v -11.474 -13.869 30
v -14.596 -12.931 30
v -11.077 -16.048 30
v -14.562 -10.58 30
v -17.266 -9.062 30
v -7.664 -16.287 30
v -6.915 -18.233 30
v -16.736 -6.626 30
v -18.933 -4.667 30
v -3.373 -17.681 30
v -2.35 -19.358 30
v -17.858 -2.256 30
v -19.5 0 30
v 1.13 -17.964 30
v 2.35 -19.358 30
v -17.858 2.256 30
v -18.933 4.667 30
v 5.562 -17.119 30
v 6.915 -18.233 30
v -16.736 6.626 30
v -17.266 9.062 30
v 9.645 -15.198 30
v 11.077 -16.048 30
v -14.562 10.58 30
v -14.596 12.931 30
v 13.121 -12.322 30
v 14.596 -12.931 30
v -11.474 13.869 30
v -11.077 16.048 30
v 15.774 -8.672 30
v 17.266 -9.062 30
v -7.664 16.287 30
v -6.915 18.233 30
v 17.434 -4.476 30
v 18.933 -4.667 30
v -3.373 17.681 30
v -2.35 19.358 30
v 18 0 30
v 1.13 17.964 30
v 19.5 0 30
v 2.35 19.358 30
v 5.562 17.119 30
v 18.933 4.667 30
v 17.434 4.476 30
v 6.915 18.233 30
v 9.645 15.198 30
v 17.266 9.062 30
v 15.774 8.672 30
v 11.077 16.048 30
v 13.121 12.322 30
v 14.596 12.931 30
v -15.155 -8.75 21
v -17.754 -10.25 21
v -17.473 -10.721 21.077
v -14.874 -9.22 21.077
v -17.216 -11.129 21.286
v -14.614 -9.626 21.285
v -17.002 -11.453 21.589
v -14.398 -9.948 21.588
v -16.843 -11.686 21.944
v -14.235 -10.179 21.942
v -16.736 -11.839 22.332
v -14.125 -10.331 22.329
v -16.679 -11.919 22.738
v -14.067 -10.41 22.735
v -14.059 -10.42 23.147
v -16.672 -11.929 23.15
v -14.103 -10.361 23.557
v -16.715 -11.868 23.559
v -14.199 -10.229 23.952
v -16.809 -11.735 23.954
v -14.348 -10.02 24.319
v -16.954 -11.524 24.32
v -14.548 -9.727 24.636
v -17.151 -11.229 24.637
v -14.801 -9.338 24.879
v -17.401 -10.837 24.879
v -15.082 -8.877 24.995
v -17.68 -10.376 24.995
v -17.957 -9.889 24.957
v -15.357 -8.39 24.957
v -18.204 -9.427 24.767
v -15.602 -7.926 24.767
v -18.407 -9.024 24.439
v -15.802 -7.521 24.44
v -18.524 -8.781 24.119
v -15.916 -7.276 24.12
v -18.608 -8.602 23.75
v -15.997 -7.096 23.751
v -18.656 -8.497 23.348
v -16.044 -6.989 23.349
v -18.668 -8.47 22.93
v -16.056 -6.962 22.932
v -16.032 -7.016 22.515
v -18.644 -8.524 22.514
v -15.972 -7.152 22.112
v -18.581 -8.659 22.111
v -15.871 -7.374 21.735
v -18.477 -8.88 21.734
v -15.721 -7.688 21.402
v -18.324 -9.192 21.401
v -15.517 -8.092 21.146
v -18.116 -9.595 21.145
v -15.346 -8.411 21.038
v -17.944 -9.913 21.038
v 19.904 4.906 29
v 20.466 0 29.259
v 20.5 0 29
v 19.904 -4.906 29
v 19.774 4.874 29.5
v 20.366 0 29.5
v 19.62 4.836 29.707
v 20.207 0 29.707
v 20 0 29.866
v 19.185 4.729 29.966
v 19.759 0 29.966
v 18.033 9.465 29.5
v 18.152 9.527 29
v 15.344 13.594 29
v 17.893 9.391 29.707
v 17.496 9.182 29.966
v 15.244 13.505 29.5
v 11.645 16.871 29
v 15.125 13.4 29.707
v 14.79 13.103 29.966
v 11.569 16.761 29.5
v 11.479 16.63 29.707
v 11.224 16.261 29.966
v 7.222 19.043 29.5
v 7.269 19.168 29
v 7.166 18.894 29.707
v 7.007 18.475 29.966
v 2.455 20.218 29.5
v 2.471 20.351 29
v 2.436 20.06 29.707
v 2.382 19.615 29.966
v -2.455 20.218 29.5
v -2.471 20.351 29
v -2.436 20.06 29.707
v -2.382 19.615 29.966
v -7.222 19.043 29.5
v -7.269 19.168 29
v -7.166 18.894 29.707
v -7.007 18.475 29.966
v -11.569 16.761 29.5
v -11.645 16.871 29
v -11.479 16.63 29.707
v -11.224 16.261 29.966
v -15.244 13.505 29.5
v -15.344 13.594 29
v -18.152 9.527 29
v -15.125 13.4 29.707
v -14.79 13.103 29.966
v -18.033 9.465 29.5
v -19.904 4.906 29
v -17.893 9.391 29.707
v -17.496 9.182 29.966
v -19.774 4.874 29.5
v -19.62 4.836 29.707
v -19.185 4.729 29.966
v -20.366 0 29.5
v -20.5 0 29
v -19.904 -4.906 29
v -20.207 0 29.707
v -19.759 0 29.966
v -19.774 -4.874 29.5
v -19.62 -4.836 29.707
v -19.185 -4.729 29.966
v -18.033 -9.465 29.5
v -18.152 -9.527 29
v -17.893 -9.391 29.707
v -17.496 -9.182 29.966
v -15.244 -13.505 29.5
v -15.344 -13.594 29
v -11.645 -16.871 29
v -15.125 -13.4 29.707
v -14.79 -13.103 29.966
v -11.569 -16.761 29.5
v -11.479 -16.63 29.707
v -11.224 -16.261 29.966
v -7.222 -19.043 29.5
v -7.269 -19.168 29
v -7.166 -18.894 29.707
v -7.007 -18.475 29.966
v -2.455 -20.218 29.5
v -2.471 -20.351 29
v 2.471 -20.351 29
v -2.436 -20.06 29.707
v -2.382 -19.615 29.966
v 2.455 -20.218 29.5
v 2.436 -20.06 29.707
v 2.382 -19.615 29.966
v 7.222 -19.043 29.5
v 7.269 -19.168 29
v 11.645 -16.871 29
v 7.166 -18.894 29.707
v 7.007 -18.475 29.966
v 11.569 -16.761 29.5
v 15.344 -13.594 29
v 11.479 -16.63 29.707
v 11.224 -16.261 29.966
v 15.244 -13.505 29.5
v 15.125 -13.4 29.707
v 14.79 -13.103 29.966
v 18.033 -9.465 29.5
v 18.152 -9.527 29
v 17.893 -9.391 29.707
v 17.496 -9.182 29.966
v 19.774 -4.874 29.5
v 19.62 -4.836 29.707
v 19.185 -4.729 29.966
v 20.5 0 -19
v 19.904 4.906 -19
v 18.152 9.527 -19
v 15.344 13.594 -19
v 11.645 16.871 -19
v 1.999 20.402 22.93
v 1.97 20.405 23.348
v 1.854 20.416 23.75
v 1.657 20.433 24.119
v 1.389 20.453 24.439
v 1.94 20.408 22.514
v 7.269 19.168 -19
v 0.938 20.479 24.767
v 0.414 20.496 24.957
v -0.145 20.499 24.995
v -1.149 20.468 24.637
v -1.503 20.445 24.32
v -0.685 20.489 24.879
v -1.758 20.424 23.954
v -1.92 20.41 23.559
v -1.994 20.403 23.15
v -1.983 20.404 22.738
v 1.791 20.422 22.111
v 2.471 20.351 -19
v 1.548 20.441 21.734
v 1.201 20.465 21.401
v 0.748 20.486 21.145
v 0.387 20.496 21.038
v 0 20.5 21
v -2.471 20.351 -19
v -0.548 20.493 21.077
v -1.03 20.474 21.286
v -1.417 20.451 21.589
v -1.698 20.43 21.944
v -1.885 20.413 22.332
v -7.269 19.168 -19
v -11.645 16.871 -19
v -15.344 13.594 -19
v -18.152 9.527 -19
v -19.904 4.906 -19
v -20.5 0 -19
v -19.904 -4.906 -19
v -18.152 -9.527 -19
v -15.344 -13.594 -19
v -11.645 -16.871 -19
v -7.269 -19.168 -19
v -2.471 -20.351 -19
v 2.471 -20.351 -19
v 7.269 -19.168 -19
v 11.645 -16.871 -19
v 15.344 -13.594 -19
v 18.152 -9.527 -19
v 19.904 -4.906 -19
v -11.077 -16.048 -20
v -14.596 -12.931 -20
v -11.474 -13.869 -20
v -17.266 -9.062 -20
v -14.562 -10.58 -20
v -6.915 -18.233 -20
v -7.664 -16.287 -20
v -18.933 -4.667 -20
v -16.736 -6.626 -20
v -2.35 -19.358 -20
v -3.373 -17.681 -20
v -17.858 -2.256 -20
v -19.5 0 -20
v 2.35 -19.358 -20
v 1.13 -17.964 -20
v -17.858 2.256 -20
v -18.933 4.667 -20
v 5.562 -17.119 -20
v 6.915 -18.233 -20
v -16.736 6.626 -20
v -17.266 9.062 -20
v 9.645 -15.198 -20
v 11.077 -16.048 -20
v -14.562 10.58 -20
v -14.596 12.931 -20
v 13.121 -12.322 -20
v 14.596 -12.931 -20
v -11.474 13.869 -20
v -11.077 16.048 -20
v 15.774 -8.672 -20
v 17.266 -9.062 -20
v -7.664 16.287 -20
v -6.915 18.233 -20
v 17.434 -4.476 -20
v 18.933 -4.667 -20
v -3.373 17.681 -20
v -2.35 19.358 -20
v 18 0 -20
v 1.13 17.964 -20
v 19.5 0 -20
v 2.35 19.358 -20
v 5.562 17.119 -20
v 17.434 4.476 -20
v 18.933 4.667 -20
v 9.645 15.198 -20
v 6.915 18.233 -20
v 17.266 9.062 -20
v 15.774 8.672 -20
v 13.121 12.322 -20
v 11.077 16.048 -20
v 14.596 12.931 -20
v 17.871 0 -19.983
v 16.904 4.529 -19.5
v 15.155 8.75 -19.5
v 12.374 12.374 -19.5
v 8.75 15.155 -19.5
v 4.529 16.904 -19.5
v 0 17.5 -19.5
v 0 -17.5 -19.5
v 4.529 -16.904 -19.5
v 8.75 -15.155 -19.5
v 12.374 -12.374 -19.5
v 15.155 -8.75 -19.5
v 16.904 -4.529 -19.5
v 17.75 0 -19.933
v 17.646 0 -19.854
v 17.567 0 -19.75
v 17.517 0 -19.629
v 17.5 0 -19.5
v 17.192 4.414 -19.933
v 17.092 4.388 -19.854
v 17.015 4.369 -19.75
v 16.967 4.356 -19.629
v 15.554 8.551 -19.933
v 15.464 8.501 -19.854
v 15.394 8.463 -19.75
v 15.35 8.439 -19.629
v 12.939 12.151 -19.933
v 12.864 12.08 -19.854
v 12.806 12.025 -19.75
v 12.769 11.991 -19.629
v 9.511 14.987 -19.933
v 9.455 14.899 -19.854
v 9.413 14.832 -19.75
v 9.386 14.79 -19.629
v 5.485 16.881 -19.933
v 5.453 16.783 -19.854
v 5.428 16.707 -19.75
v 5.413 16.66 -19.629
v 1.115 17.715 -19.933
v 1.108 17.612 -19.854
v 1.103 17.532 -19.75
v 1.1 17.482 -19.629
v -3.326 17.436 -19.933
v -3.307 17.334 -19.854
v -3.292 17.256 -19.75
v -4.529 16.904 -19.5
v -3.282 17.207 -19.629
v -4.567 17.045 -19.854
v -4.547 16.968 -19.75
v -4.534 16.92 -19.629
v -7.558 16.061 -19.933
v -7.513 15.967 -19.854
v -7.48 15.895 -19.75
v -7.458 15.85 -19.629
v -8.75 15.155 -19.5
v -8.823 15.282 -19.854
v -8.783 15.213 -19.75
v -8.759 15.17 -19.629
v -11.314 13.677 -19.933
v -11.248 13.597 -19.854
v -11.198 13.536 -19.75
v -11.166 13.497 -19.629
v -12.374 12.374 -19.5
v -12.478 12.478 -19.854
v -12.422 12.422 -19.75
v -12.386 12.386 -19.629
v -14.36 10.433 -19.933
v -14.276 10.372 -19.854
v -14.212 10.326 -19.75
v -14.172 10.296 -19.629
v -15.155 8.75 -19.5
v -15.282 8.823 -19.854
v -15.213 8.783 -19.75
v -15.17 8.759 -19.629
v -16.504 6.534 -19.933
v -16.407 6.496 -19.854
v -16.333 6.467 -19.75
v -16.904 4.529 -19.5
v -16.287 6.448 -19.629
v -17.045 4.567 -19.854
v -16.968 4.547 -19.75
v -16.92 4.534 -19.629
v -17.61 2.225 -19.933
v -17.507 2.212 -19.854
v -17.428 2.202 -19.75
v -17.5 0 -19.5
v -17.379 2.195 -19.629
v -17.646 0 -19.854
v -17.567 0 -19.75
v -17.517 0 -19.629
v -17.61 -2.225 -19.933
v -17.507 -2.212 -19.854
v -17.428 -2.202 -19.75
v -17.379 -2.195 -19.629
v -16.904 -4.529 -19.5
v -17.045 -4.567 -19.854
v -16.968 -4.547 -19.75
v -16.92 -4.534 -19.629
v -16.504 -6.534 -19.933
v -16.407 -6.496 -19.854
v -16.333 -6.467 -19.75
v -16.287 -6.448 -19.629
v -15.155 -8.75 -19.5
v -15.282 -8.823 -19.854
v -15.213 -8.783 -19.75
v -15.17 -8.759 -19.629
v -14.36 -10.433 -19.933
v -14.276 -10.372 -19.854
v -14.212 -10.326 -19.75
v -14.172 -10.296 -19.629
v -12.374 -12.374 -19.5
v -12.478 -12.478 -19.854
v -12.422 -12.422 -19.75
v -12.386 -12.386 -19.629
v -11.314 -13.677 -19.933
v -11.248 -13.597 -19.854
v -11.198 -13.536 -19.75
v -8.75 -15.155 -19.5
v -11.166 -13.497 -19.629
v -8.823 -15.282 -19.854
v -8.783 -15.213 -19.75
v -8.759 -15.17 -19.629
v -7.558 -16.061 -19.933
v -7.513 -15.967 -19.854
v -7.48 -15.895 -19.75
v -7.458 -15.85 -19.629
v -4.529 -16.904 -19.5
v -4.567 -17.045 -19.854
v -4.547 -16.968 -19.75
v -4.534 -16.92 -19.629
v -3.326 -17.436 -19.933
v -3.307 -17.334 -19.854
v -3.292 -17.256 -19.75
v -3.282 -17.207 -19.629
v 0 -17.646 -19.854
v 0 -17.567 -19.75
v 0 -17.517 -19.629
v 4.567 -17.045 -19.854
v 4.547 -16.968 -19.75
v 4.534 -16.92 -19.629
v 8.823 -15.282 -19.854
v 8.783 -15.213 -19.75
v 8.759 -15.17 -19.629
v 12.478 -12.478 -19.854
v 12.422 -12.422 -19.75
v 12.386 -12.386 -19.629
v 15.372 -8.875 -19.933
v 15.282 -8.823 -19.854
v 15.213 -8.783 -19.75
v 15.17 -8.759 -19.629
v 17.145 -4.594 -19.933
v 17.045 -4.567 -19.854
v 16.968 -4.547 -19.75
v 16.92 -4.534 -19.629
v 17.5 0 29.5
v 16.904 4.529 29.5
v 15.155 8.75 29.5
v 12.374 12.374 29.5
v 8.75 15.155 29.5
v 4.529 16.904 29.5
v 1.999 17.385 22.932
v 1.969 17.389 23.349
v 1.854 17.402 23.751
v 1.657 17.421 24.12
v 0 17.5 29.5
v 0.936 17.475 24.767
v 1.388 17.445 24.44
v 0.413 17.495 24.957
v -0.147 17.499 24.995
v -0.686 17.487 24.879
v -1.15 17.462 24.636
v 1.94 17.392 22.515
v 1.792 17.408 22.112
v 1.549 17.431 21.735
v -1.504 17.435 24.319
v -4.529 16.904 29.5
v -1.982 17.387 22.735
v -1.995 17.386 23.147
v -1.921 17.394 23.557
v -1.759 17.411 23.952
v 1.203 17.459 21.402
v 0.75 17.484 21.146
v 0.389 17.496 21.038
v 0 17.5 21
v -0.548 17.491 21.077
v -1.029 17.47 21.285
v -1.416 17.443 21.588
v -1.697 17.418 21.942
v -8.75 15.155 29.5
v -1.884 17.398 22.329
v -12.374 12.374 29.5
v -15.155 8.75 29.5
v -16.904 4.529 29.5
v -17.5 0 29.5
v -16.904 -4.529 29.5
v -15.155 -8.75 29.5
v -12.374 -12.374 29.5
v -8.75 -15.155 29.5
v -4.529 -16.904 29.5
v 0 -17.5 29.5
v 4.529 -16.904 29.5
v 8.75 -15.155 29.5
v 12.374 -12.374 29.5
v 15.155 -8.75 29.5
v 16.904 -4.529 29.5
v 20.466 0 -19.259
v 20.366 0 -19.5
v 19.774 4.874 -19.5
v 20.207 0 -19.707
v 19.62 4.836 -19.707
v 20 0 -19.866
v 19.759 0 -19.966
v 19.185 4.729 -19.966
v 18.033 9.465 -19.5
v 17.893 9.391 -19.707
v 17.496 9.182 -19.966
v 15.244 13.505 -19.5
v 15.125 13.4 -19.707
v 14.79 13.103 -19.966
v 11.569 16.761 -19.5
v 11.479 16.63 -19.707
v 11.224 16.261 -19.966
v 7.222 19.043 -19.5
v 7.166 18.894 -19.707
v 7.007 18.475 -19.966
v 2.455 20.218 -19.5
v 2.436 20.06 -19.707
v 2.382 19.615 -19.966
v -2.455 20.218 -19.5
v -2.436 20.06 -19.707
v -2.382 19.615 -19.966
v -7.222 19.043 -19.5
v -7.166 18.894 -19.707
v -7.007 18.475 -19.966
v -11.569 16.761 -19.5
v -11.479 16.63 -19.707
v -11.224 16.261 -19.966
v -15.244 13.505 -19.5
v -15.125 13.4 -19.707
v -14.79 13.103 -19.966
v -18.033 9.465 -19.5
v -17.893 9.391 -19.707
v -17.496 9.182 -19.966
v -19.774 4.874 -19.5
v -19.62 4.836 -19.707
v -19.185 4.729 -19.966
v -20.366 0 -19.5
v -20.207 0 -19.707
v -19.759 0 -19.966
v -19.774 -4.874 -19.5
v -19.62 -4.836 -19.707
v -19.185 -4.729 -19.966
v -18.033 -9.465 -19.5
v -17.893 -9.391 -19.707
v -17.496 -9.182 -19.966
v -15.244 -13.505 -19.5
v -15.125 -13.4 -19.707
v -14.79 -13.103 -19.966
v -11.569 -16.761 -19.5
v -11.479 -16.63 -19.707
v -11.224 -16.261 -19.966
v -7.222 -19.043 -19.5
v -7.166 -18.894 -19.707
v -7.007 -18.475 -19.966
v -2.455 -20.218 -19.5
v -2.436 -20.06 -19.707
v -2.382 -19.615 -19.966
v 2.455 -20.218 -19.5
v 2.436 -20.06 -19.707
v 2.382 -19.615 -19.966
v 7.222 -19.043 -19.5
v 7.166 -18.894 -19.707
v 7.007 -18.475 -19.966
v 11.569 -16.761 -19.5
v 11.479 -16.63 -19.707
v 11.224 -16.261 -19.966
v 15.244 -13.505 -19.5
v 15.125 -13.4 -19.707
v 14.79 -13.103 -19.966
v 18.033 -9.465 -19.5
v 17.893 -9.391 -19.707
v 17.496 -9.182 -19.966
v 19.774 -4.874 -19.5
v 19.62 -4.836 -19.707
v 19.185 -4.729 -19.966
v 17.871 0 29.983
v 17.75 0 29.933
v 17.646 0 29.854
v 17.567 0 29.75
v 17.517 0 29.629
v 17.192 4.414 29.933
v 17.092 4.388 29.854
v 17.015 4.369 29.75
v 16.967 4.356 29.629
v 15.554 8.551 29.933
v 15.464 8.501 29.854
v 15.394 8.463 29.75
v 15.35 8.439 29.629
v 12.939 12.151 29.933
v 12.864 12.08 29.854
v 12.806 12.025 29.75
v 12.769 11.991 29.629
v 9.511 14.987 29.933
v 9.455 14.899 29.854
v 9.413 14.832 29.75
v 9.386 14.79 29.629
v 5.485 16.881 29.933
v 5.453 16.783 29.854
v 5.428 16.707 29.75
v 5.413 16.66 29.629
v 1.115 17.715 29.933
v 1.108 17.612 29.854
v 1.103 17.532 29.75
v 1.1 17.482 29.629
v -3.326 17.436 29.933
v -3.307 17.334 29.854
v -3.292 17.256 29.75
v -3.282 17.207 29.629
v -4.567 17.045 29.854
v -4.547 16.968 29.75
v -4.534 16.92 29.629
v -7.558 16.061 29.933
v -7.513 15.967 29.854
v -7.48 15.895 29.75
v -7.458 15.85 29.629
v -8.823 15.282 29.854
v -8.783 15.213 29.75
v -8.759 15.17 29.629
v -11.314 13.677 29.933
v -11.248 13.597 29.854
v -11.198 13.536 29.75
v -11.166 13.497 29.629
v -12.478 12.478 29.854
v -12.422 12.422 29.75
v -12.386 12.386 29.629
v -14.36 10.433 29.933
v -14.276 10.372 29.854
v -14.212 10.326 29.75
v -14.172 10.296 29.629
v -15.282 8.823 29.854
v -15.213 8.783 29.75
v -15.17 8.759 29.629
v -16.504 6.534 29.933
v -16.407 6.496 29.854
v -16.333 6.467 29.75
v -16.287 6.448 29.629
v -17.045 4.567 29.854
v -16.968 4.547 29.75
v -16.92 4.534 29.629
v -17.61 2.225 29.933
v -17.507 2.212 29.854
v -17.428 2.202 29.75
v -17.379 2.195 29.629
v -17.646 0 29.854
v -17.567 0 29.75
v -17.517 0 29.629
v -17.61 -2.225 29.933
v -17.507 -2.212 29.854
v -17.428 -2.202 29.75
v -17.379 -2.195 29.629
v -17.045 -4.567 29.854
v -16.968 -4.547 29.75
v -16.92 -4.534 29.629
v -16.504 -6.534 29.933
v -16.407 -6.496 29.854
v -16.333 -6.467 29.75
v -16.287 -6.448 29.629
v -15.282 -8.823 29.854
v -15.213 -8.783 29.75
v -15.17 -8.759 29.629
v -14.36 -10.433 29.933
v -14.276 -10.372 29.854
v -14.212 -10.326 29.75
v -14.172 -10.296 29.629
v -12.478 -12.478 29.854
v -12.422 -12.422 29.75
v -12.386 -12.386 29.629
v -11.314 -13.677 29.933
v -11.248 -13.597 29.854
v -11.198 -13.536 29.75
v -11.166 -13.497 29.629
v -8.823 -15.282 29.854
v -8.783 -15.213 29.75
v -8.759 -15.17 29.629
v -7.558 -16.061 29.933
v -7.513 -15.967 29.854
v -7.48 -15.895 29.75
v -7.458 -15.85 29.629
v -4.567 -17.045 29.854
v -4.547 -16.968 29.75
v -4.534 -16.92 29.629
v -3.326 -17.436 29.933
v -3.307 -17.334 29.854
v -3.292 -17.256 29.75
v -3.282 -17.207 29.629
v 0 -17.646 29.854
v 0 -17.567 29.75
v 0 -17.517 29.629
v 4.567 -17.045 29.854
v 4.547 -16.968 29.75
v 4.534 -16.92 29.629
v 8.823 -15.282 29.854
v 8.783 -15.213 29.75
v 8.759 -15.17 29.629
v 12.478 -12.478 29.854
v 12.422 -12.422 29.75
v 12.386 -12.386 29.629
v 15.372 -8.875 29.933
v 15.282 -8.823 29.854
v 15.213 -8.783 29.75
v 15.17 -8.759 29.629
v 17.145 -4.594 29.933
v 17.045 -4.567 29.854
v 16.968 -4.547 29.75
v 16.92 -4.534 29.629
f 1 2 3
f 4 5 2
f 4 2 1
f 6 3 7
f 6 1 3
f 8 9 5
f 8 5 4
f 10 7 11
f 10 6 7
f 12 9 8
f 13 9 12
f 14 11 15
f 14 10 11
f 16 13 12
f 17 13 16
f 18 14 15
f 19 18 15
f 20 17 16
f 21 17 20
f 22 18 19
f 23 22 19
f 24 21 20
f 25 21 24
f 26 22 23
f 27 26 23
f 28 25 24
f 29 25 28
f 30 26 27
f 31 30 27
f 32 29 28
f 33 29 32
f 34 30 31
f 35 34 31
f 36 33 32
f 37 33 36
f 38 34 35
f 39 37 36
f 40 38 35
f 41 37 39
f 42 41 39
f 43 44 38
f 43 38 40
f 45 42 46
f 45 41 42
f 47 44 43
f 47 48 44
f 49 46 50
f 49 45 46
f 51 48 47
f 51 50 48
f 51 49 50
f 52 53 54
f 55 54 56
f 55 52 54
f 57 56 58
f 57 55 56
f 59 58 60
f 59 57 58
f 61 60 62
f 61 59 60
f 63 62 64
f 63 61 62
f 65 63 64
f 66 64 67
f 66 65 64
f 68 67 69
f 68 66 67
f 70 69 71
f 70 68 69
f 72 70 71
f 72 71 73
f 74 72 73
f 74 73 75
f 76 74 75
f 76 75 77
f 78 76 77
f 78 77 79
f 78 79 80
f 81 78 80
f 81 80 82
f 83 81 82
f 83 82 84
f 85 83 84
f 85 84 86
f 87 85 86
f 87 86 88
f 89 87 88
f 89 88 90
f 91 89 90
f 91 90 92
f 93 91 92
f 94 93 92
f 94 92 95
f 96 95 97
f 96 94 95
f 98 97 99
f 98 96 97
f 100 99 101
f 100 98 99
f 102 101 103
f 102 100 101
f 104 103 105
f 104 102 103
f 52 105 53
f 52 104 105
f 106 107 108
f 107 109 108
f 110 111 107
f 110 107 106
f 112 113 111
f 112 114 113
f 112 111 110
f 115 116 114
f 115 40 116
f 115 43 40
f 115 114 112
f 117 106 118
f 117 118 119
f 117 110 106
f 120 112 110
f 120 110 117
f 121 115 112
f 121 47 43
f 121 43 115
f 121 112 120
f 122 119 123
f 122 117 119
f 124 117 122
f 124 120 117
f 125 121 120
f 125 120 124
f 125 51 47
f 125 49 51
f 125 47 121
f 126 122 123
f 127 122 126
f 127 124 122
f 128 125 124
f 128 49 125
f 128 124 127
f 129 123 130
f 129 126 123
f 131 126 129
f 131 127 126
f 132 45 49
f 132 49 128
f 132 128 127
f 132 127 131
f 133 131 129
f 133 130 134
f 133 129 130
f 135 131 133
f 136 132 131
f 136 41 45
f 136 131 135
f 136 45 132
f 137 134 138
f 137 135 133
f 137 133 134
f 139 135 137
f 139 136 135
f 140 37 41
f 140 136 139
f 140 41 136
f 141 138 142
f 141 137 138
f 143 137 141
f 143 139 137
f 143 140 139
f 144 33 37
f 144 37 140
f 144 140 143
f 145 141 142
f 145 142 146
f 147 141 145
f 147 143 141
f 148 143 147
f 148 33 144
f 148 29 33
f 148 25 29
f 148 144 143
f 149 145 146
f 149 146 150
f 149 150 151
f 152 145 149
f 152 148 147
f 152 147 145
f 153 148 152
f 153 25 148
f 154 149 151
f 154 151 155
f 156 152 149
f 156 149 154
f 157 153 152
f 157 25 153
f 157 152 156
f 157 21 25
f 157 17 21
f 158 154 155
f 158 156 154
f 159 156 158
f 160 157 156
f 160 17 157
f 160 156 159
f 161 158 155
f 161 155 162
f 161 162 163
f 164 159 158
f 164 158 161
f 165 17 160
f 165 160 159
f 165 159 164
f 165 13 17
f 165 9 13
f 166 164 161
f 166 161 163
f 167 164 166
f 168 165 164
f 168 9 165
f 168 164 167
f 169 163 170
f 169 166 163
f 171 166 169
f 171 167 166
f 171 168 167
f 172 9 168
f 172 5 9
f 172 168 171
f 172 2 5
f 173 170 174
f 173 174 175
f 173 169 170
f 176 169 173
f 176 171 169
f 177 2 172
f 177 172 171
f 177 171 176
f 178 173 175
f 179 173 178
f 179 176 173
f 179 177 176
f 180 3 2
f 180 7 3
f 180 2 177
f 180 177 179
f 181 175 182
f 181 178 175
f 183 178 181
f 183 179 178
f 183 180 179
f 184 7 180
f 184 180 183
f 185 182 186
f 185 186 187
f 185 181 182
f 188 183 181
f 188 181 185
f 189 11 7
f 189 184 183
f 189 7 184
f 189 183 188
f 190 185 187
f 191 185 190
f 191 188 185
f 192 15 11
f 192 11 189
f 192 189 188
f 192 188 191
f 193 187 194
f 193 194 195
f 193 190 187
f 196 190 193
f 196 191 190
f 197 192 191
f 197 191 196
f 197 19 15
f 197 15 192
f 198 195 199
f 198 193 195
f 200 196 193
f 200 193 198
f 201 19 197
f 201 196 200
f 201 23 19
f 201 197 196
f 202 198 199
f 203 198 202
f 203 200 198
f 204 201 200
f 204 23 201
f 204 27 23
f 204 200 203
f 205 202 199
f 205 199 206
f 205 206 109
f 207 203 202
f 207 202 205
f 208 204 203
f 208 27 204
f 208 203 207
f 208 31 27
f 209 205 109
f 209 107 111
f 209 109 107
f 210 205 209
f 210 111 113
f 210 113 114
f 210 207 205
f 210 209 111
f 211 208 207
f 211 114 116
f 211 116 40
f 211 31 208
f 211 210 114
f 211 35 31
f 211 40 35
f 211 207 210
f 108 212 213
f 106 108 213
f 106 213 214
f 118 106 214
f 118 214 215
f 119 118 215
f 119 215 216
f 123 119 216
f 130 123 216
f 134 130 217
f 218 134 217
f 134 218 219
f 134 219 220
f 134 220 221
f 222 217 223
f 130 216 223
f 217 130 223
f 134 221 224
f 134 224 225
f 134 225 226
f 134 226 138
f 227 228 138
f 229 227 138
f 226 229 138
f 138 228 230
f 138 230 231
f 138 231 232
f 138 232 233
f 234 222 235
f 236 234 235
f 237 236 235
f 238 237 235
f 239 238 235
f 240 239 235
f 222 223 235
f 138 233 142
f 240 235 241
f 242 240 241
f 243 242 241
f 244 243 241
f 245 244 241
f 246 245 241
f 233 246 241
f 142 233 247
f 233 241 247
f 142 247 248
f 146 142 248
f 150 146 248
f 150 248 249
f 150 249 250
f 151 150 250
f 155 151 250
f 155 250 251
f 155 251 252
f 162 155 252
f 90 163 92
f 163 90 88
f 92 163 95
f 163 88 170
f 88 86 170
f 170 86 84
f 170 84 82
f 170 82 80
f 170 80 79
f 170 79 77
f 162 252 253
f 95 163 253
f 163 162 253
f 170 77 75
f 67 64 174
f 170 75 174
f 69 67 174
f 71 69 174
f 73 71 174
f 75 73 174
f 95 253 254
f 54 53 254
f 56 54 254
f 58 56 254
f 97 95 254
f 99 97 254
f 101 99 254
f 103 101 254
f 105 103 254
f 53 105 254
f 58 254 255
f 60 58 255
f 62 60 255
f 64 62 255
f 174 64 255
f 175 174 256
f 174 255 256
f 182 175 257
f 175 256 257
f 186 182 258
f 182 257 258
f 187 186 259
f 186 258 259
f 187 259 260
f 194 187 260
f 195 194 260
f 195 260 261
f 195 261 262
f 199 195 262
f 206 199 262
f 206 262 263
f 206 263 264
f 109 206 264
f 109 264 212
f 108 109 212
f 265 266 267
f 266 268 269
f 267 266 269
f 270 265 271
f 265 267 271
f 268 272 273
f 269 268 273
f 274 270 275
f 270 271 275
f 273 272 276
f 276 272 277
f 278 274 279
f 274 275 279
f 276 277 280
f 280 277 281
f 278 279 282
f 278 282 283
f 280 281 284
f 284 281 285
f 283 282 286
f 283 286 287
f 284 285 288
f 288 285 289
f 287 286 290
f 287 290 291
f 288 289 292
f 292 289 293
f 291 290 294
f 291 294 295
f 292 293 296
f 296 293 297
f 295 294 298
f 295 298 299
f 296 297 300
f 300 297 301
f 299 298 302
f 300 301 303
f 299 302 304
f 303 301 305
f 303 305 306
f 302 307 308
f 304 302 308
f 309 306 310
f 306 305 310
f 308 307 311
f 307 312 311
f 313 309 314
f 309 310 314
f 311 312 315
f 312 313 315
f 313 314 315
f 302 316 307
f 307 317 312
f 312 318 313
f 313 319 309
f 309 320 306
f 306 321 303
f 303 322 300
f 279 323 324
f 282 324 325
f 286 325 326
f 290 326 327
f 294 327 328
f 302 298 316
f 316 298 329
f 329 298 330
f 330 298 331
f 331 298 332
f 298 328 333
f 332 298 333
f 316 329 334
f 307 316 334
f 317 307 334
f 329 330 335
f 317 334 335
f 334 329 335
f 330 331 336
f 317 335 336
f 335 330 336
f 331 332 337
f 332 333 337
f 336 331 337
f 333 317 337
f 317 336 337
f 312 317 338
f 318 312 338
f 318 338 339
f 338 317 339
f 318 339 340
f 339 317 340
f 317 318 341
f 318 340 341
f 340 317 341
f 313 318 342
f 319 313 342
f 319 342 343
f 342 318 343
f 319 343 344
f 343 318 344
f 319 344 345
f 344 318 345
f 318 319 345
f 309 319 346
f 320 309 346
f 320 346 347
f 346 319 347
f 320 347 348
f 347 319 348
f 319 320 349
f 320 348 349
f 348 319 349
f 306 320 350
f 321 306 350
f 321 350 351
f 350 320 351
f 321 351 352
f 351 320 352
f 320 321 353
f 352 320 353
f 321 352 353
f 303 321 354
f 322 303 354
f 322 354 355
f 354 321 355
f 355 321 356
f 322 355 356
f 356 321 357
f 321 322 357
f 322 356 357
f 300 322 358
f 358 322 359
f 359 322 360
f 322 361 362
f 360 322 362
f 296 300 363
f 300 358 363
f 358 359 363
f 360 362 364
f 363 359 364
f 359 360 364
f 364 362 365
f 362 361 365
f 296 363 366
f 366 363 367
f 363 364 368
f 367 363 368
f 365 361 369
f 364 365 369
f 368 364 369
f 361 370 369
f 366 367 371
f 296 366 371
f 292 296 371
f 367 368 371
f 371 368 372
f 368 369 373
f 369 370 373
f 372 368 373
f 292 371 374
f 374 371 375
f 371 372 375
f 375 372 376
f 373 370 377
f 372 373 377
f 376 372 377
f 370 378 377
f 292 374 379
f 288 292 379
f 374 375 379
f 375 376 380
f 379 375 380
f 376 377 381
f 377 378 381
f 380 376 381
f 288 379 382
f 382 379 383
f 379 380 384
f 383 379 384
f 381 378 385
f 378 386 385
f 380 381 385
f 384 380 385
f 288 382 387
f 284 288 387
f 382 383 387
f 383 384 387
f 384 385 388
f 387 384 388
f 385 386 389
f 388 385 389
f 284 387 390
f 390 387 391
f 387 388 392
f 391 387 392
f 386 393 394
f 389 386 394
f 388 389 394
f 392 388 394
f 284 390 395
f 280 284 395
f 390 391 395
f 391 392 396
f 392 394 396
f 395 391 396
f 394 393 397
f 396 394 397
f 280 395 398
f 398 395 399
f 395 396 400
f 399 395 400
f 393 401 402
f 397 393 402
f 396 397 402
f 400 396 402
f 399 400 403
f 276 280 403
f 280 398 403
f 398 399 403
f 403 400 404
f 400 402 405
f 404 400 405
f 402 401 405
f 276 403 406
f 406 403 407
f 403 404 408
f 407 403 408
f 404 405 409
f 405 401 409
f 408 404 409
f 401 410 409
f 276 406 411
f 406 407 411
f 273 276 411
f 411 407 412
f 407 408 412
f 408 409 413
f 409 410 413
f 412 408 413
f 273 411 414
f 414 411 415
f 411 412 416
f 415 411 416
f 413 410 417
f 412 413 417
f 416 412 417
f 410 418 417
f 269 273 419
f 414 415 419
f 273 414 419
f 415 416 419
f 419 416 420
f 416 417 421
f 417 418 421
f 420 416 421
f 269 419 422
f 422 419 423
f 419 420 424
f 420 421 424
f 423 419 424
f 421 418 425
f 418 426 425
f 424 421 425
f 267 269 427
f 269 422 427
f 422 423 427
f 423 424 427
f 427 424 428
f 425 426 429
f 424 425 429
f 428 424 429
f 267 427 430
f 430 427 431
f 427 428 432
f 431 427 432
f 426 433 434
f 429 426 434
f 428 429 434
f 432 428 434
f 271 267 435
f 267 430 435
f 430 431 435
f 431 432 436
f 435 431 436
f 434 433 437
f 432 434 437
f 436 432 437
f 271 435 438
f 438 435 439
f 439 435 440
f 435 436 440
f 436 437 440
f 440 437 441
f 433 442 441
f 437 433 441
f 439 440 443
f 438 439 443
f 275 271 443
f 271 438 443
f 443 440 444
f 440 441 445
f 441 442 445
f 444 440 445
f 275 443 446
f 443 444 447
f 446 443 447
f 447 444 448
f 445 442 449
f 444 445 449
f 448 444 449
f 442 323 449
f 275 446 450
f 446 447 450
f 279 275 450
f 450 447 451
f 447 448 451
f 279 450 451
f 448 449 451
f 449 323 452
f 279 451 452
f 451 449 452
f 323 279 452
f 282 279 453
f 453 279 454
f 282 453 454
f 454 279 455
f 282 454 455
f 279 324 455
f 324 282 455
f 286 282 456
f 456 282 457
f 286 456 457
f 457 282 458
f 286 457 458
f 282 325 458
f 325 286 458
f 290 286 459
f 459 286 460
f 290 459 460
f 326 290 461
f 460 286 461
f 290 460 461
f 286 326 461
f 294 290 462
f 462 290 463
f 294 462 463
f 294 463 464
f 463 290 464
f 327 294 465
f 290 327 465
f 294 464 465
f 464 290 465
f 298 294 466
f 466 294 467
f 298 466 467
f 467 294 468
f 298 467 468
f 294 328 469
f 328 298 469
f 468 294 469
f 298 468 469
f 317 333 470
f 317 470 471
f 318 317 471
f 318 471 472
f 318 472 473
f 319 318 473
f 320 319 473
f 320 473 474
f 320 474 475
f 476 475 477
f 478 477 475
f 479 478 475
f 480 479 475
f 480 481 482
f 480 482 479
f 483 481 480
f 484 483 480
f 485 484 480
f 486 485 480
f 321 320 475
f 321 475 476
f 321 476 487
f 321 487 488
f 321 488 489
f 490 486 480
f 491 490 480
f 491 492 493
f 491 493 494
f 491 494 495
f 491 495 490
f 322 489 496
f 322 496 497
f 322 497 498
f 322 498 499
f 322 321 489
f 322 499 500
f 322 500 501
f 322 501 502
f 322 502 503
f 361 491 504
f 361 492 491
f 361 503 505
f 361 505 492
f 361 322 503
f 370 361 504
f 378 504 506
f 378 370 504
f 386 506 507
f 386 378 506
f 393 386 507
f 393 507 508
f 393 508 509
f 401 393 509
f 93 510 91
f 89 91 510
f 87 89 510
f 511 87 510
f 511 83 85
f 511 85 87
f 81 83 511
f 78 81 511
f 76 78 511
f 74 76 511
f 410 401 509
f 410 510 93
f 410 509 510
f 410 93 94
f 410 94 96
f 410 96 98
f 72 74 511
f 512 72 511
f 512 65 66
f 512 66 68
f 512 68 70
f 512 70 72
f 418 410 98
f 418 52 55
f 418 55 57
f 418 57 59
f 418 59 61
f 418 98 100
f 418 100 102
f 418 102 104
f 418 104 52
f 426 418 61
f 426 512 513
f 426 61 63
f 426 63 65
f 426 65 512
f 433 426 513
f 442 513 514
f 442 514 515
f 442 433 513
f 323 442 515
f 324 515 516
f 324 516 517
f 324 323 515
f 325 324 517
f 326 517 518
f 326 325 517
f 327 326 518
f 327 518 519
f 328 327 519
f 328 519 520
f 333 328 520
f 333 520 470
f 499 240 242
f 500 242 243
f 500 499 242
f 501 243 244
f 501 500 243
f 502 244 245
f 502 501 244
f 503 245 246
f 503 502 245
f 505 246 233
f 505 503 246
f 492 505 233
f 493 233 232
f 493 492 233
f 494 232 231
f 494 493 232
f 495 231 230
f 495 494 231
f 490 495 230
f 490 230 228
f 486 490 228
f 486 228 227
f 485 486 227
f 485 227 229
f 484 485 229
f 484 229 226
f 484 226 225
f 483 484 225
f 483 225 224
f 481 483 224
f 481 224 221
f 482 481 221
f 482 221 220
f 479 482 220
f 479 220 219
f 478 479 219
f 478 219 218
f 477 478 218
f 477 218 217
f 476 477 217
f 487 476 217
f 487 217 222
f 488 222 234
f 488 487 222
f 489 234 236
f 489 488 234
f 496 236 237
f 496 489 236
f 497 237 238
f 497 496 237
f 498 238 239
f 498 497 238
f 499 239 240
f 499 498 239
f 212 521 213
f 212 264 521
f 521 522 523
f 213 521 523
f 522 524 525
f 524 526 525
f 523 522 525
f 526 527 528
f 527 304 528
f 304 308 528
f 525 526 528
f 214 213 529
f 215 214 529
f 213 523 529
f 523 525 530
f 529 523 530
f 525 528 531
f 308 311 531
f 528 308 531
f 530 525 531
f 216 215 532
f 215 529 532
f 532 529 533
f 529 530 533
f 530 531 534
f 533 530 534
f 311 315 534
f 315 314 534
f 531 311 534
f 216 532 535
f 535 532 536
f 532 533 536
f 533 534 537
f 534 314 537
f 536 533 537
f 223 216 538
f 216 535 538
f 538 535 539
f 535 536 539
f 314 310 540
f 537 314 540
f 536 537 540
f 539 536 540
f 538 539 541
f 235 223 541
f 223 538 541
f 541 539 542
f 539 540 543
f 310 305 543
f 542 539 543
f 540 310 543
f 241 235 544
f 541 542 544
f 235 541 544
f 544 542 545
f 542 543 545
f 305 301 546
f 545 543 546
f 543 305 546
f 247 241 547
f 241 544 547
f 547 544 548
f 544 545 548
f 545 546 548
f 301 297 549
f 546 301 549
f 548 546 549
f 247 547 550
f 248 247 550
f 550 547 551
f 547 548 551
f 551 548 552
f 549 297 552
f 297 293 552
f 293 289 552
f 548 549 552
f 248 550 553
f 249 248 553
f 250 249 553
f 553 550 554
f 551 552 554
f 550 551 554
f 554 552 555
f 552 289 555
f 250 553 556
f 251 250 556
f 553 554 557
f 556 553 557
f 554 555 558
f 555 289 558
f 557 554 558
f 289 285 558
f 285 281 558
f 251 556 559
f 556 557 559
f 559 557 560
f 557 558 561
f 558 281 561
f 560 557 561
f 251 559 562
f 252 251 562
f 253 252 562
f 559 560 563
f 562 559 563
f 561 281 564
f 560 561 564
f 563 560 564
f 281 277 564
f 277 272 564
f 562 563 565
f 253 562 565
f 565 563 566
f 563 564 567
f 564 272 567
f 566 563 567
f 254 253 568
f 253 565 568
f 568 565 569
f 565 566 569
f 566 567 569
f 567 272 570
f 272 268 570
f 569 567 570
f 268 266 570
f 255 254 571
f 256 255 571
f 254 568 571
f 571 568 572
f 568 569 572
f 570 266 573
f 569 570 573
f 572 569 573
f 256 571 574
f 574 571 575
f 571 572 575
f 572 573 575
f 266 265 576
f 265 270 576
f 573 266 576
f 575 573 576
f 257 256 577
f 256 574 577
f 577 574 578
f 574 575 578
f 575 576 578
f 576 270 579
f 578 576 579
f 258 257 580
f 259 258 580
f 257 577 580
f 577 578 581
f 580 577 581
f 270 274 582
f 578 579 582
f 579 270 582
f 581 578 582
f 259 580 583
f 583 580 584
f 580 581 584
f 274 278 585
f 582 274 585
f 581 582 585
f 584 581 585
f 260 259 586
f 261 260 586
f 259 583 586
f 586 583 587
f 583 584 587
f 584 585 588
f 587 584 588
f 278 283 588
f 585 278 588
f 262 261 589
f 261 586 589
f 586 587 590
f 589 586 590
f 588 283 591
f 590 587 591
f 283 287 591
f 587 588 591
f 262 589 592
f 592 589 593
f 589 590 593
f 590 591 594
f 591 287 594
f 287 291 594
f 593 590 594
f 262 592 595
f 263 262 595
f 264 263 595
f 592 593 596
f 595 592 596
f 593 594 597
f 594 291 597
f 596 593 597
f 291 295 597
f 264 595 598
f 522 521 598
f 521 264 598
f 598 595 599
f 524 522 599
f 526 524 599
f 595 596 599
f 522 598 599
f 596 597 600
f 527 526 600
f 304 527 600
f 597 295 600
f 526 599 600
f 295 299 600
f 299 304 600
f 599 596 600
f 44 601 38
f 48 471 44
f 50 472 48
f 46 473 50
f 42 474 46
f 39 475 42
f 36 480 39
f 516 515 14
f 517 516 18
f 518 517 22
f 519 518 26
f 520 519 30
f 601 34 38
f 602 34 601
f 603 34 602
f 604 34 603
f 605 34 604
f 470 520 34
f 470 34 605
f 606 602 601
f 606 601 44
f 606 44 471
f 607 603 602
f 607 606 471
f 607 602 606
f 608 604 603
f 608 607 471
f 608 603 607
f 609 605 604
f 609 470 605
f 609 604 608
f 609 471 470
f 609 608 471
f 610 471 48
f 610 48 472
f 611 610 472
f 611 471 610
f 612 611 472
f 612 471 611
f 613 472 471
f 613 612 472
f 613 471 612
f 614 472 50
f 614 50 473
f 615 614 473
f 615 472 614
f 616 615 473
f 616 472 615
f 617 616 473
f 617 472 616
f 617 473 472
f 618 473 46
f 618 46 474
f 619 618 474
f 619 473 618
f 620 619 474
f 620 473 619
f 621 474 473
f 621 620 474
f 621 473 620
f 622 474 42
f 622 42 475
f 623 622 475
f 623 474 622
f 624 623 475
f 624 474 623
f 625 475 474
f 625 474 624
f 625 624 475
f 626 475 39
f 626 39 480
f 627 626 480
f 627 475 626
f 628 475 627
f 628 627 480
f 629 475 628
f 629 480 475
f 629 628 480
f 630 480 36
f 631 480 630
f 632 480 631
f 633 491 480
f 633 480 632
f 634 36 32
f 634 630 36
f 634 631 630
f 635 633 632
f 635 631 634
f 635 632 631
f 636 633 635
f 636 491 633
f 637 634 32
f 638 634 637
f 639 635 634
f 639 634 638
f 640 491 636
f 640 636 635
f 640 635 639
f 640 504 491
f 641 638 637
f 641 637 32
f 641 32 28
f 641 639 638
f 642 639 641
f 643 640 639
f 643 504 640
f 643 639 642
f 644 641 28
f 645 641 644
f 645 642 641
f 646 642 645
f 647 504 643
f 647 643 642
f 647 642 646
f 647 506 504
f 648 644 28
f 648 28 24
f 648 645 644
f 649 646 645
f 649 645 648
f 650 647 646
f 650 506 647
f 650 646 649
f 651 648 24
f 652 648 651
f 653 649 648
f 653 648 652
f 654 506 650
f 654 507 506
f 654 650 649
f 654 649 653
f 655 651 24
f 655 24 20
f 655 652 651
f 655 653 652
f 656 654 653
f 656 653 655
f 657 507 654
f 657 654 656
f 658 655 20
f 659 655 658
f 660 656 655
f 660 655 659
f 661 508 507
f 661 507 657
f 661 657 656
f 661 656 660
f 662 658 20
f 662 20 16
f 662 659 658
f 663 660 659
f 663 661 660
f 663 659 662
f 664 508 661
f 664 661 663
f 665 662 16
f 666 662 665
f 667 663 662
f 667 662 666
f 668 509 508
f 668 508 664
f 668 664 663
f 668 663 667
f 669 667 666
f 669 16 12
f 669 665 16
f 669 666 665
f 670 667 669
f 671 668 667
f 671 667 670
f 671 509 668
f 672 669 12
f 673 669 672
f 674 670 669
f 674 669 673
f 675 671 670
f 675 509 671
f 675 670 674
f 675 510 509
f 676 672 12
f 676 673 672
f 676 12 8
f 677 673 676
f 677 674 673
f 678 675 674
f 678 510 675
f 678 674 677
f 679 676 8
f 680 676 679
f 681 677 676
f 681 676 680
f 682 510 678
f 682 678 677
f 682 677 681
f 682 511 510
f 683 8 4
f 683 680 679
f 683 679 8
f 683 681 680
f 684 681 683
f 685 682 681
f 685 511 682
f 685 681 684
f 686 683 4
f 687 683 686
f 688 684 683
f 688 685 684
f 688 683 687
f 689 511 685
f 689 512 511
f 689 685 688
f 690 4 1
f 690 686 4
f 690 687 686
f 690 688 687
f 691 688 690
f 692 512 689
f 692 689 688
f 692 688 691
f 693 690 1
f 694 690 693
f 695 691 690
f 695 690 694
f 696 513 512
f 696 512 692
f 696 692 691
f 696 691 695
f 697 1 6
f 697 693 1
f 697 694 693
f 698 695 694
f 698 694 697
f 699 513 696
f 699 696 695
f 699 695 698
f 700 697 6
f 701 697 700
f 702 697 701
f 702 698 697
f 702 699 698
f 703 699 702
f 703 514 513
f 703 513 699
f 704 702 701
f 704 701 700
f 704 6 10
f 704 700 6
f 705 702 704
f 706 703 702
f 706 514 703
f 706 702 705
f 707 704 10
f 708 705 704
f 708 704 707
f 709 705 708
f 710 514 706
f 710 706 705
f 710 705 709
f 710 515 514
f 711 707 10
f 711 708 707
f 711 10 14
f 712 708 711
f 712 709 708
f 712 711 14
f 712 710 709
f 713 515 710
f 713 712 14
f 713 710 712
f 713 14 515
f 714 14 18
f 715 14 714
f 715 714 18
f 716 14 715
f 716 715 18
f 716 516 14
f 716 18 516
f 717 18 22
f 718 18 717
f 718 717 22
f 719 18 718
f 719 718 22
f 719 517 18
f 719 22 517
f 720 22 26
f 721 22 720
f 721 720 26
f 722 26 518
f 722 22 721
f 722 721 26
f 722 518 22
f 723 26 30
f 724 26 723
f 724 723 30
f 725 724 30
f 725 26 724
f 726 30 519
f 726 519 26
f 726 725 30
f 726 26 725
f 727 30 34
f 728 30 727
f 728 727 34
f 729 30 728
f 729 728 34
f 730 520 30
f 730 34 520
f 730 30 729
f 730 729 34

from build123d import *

# Parameters (mm, degrees)
BOSS_EXTRUDE1_DEPTH      = 30
BOSS_EXTRUDE1_DEPTH_BACK = 20
SKETCH1_R                = 20.5
SKETCH1_R_2              = 17.5
SKETCH3_R                = 2
CUT_EXTRUDE1_DEPTH       = 42.71930009
CIRPATTERN1_COUNT        = 2
CIRPATTERN1_ANGLE        = 120
FILLET1_R                = 1
FILLET2_R                = 0.5


with BuildPart() as part:
    # Sketch1 → Boss-Extrude1 (new, two sides: drawn at the far end of the back side and taken through both)
    with BuildSketch(Plane.XY.offset(-BOSS_EXTRUDE1_DEPTH_BACK)):
        Circle(SKETCH1_R)
        Circle(SKETCH1_R_2, mode=Mode.SUBTRACT)
    extrude(amount=BOSS_EXTRUDE1_DEPTH + BOSS_EXTRUDE1_DEPTH_BACK)

    # Sketch3 → Cut-Extrude1 (cut, through all)
    with BuildSketch(Plane(origin=(0, 0, 0), x_dir=(1, 0, 0), z_dir=(0, 1, 0))):
        with Locations(Location((0, -23, 0), (0, 0, 90))):
            Circle(SKETCH3_R)
    cut_extrude1 = extrude(amount=CUT_EXTRUDE1_DEPTH, mode=Mode.SUBTRACT)

    # CirPattern1: Cut-Extrude1 ×2 about axis
    cirpattern1_axis = Axis((0, 0, -20), (0, 0, 1))
    for i in range(1, CIRPATTERN1_COUNT):
        add(cut_extrude1.rotate(cirpattern1_axis, i * CIRPATTERN1_ANGLE / (CIRPATTERN1_COUNT - 1)), mode=Mode.SUBTRACT)

    # Fillet1
    fillet1_edges = [part.edges().sort_by_distance(p)[0] for p in [
        (-20.5, 0, -20),
        (-20.5, 0, 30),
    ]]
    fillet(fillet1_edges, radius=FILLET1_R)

    # Fillet2
    fillet2_edges = [part.edges().sort_by_distance(p)[0] for p in [
        (-17.5, 0, -20),
        (-17.5, 0, 30),
    ]]
    fillet(fillet2_edges, radius=FILLET2_R)


solid = part.part
